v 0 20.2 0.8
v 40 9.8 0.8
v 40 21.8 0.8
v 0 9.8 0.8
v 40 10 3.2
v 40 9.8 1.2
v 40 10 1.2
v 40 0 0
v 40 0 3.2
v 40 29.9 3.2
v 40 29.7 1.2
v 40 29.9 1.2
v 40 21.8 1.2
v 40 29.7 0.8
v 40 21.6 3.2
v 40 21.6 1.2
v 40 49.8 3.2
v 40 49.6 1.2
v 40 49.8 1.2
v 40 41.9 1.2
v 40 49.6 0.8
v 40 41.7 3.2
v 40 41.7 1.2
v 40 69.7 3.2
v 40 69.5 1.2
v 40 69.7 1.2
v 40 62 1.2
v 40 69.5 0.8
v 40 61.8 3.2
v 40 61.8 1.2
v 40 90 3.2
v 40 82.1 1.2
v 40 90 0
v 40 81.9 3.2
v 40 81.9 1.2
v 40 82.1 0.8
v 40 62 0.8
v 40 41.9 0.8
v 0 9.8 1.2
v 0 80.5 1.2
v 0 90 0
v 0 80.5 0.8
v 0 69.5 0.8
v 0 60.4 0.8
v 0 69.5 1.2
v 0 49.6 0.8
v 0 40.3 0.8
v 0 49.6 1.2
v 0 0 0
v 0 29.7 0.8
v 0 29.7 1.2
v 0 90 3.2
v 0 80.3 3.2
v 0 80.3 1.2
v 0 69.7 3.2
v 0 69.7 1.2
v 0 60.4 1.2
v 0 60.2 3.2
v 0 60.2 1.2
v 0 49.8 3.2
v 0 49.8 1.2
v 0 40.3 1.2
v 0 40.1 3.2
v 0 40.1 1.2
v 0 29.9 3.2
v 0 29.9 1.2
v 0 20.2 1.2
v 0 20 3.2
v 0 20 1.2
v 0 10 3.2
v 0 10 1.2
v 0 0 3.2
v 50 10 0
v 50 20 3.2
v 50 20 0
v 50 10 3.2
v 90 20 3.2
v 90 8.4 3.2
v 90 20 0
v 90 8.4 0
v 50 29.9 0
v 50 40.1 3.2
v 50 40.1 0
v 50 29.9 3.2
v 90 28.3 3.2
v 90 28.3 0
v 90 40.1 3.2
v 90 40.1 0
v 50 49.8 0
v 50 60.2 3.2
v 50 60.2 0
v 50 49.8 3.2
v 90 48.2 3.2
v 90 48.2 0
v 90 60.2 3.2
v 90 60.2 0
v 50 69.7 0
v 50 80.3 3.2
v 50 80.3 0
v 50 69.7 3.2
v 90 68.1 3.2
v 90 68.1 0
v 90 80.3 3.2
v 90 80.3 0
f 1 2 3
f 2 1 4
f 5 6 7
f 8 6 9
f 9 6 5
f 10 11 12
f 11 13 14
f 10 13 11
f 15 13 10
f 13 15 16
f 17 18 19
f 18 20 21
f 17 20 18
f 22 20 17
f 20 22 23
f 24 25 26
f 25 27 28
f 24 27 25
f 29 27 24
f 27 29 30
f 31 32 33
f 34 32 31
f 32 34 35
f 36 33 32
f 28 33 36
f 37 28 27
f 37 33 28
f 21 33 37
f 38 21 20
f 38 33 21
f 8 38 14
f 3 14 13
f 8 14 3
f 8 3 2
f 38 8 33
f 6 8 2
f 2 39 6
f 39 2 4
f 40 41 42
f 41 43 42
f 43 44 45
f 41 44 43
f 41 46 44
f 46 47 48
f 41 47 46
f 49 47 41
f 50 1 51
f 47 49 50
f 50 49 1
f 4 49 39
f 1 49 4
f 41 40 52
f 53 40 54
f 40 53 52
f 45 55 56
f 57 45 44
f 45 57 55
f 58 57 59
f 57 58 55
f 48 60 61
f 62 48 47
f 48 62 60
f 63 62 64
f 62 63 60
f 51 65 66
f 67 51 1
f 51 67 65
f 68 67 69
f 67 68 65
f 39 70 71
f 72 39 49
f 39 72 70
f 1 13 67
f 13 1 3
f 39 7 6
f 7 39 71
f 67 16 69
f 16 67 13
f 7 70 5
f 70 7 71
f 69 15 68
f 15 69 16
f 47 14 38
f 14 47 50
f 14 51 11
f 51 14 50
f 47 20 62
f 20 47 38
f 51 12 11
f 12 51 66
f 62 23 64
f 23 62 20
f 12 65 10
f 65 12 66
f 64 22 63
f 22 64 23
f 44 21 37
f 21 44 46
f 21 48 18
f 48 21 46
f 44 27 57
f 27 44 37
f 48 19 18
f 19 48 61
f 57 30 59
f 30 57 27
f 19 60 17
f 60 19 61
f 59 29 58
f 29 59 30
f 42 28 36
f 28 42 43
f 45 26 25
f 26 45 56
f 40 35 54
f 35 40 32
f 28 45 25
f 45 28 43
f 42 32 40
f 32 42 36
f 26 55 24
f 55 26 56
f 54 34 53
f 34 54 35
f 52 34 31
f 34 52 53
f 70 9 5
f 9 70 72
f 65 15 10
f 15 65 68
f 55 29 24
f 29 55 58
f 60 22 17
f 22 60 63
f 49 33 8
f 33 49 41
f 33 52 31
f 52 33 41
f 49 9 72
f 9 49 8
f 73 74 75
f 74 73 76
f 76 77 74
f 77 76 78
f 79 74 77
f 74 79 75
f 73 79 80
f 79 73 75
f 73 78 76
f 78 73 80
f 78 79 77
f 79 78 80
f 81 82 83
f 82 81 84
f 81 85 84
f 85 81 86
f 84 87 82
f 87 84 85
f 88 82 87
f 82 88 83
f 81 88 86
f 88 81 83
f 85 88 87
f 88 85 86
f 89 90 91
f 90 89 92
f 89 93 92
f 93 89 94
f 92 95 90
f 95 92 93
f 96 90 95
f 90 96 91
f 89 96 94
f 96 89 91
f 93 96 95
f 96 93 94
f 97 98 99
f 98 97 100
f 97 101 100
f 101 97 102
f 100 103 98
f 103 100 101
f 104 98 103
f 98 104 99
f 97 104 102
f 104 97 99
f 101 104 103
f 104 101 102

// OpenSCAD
// Number of test strips to print (for averaging)
strips = 4; // [1:4]

// Height of the strips
height = 3.2; // [3.2, 6.4]

/* [hidden] */

a = 40; // Block length
b = 10; // Block spacings
d = a/25; // Taper amount (1 in 100 slope, divided by 4 surfaces)
e = 0.2; // Undercut width
f = 0.4; // Undercut height
g = b; // cutout centering
h = b; // Cutout width, roughly
i = 0.1; // Test strip increments

difference () {
    cube([a,b*(strips*2 + 1),height]);
    for (x=[0:strips-1]) {
        wedge = [[0,0],[0,b],[a,b+d],[a,0],[0,0]];
        adjusted_wedge = wedge + [[0,-i*x],[0,i*x],[0,i*x],[0,-i*x],[0,-i*x]];
        undercut_wedge = adjusted_wedge + [[0,-e],[0,e],[0,e],[0,-e],[0,-e]];
        translate([0,(2*x + 1)*b,height/4]) {
            linear_extrude(height=f) {
                polygon(undercut_wedge);
            };
            linear_extrude(height=height) {
                polygon(adjusted_wedge);
            };
        };
    };
}

for (x=[0:strips - 1]) {
    wedge = [[0,0],[0,b],[a,b],[a,-d],[0,0]];
    adjusted_wedge = wedge + [[0,-i*x],[0,i*x],[0,i*x],[0,-i*x],[0,-i*x]];
    translate ([a+10,(1 + 2*x)*b,0]) linear_extrude(height=height) polygon(adjusted_wedge);
}
